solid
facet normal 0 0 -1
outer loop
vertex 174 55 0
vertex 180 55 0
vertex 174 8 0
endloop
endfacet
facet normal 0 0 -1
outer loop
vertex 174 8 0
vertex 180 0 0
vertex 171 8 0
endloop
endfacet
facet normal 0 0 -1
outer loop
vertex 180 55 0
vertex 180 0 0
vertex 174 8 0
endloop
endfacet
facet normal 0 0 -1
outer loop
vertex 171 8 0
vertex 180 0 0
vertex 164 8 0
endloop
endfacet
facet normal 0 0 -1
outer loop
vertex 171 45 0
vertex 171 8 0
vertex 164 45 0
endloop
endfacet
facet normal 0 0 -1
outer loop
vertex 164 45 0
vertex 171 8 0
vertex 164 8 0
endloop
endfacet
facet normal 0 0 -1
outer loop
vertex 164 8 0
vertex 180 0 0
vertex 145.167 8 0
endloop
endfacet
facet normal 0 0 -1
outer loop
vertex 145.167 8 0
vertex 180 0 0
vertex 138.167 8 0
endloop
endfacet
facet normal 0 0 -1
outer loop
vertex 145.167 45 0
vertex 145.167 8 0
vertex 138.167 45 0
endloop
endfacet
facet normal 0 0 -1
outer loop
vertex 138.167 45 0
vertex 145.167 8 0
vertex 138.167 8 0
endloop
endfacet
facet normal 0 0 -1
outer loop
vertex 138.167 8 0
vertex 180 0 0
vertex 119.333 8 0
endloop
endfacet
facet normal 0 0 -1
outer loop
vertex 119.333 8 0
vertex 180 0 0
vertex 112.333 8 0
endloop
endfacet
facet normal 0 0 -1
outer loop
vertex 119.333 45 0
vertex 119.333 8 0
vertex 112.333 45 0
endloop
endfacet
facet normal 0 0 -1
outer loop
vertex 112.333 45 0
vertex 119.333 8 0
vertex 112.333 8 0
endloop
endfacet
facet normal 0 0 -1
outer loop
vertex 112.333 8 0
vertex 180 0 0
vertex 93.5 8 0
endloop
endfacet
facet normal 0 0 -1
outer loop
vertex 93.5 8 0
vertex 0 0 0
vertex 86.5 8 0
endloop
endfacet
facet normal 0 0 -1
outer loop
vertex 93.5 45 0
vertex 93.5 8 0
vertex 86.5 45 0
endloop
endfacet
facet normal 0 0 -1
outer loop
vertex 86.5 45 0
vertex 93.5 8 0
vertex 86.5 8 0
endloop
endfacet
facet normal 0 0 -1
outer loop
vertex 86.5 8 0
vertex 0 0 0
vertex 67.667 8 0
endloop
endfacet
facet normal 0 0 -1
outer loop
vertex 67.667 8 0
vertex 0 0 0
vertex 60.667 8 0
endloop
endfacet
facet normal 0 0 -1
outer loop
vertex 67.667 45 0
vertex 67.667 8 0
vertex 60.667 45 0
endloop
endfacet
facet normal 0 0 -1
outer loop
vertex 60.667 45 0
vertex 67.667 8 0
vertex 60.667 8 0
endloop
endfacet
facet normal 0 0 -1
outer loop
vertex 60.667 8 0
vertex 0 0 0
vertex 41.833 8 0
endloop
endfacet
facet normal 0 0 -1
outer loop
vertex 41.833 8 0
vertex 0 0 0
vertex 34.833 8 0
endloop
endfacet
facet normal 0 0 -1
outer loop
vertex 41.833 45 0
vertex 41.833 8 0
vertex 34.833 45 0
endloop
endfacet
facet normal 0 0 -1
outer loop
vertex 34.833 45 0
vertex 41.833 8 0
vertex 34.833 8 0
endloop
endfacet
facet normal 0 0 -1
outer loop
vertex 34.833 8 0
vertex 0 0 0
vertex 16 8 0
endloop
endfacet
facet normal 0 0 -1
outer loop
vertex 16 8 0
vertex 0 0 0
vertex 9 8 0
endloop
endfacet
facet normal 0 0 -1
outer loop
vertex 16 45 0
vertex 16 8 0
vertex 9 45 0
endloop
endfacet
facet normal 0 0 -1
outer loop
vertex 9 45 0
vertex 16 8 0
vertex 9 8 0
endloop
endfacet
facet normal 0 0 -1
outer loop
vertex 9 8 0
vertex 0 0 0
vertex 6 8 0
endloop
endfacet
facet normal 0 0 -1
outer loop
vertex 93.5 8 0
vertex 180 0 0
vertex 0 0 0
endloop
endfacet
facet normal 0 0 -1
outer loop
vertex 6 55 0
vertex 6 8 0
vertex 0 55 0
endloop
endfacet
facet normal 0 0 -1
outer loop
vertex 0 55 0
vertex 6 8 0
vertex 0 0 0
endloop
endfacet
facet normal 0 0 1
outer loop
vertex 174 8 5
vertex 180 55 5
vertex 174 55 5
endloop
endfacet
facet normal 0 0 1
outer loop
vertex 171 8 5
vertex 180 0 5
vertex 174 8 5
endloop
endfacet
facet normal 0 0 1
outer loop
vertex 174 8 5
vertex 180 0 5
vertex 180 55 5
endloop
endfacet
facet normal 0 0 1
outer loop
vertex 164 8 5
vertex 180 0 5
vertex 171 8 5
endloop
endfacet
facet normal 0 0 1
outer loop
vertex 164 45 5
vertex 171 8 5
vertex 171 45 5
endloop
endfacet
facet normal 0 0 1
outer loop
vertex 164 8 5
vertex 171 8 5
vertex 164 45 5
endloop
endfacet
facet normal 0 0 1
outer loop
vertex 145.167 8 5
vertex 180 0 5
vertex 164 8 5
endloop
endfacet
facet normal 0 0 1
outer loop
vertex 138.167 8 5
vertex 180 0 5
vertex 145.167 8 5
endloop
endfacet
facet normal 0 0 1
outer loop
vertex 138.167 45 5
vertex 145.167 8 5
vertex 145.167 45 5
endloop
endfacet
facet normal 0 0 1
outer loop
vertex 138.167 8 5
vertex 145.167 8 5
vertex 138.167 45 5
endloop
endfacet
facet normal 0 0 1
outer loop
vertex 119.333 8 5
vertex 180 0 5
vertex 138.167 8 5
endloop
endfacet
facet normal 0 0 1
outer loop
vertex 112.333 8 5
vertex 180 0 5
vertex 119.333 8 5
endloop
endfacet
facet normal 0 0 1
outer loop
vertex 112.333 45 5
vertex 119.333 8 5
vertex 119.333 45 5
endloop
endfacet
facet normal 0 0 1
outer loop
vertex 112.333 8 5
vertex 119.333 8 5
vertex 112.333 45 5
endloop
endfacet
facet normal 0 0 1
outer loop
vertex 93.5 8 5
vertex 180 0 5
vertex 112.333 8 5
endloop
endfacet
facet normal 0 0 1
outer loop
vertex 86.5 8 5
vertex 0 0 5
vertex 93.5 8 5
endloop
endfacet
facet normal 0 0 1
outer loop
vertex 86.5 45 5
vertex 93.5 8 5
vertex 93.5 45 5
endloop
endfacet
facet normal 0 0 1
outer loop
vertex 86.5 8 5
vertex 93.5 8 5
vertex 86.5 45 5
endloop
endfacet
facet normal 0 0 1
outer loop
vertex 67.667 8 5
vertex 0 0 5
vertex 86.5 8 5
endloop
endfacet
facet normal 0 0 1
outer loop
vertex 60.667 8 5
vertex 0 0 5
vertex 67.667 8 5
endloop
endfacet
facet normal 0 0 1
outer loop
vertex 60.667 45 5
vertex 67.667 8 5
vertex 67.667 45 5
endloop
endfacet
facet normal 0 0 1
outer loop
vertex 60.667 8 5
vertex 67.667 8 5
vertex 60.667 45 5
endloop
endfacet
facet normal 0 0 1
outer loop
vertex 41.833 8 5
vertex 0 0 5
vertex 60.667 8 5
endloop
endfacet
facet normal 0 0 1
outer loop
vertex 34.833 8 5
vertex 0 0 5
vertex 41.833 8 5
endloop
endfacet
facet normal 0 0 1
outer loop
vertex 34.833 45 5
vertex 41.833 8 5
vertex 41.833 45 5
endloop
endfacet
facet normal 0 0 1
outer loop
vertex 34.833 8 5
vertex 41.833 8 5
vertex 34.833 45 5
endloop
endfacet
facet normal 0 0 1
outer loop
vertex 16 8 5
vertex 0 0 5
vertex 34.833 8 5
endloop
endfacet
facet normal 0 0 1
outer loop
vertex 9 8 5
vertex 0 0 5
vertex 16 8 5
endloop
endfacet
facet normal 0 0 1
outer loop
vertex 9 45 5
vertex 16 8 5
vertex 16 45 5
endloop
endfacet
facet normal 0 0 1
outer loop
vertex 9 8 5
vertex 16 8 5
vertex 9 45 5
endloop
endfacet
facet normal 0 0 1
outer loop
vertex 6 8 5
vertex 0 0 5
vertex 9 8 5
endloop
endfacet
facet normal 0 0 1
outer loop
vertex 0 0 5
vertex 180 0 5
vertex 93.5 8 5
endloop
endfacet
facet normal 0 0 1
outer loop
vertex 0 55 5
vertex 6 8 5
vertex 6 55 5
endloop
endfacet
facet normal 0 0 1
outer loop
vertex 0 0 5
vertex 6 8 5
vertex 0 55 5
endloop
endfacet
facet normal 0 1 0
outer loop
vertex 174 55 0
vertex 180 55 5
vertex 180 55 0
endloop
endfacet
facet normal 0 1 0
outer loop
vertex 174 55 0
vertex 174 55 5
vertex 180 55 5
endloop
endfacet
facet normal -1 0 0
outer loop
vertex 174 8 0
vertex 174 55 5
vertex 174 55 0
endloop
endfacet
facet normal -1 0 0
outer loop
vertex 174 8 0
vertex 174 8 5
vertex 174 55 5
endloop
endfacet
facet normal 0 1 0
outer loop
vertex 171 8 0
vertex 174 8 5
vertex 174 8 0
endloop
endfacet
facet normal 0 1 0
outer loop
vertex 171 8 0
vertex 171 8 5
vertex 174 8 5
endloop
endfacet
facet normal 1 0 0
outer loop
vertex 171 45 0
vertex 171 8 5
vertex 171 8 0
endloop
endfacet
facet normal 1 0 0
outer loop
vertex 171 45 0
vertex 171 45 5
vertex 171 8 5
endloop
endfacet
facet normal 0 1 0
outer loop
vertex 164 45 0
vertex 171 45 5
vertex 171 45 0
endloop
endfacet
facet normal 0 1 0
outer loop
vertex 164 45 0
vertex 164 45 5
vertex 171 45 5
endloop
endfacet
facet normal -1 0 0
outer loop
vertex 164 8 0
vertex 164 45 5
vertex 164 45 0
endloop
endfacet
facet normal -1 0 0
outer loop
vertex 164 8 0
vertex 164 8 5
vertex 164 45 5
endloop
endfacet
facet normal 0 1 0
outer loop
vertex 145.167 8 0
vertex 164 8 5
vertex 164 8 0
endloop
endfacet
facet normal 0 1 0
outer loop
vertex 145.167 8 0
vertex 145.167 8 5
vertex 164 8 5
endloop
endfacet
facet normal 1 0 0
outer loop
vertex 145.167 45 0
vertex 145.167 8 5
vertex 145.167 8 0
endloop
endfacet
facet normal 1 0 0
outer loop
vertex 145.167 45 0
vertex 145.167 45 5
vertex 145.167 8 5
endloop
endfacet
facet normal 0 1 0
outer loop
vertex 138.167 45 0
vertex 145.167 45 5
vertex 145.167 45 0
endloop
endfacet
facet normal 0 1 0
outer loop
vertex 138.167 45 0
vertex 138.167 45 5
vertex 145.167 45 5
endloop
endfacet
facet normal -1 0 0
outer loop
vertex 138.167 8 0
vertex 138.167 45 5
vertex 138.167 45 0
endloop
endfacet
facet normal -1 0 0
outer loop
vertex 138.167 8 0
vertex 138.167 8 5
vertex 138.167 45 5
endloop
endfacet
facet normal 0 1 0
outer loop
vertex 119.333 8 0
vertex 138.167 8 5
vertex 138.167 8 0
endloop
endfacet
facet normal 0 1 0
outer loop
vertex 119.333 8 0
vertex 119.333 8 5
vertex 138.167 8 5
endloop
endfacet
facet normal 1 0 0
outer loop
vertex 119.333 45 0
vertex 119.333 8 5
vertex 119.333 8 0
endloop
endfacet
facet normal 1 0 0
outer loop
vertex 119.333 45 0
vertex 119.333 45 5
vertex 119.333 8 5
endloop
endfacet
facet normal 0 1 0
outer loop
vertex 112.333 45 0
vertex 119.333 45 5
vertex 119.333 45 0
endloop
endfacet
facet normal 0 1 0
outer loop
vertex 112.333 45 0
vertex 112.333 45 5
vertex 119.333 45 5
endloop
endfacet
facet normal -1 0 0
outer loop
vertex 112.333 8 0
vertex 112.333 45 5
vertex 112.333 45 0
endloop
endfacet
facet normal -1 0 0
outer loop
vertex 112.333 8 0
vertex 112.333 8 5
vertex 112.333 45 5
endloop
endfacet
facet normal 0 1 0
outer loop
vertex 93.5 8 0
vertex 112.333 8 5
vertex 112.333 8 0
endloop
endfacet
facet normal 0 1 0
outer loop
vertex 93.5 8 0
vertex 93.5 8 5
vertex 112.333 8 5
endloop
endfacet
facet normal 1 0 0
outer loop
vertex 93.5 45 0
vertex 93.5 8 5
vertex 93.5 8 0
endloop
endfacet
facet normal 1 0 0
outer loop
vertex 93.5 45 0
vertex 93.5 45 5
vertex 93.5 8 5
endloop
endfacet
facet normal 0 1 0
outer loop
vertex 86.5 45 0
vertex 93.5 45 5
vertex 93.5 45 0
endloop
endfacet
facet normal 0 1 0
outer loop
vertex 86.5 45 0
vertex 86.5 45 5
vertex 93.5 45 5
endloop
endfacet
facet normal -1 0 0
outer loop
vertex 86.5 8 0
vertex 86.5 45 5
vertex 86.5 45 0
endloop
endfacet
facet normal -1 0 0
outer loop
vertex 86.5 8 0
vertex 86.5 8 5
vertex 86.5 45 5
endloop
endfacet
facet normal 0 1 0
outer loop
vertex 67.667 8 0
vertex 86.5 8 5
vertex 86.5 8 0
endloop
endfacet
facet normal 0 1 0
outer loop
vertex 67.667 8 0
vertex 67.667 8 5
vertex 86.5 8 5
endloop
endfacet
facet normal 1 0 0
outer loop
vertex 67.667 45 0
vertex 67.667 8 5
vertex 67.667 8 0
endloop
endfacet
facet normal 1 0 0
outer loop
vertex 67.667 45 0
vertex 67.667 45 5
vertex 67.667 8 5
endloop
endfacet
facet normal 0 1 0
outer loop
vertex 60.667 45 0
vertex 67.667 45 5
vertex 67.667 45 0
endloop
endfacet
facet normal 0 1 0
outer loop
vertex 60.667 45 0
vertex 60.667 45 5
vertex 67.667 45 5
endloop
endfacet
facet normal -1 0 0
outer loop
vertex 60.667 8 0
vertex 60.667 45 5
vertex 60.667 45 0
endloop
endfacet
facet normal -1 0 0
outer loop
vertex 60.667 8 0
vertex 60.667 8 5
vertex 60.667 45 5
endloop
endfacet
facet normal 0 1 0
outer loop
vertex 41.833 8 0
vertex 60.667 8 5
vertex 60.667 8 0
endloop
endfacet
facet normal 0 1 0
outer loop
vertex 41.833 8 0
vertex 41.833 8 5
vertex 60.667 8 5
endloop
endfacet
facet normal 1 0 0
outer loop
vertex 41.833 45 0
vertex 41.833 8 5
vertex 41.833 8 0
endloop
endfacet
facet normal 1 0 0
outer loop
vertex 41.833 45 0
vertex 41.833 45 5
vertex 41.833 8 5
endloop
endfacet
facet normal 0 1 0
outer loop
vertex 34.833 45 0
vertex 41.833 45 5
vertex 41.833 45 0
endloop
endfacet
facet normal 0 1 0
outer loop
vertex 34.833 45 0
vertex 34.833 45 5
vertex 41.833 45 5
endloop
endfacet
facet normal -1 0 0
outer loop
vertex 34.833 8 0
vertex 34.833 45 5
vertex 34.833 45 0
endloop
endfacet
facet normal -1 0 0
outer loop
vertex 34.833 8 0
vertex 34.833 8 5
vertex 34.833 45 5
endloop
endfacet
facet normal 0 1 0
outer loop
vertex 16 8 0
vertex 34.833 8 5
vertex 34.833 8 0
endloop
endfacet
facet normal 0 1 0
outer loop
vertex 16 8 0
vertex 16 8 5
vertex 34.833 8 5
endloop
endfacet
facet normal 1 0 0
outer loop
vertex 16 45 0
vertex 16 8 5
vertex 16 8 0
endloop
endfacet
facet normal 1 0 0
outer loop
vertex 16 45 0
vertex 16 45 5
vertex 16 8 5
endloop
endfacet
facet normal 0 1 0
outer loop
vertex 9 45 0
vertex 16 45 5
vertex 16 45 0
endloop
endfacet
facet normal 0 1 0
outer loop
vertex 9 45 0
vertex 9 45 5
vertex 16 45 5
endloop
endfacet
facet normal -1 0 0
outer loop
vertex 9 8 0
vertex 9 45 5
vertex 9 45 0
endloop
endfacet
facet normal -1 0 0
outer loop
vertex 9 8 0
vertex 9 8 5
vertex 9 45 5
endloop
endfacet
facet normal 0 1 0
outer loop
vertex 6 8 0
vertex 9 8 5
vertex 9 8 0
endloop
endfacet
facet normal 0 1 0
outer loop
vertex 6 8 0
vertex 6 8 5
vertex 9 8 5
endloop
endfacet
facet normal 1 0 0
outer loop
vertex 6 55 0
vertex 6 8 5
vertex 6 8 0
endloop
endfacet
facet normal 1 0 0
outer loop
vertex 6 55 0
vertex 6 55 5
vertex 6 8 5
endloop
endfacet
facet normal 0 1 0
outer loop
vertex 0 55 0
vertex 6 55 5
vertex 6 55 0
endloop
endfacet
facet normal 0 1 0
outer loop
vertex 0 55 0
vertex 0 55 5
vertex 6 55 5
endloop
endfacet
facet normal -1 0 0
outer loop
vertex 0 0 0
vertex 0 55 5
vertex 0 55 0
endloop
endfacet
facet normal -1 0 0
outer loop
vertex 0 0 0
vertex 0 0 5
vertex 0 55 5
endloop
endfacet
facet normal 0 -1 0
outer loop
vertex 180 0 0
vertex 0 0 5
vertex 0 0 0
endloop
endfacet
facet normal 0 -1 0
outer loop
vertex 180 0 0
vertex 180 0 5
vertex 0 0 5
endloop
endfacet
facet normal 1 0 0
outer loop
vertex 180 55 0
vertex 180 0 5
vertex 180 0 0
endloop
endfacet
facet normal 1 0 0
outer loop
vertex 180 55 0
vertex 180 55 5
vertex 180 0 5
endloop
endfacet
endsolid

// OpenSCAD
$fn = 32;

// ----------------------------------------------------------------------
// Guard grille: 7 slats over a 180 x 55 mm plate
// ----------------------------------------------------------------------

// --- parameters (mm) ---
profile_height = 5;       // extrusion height
profile_points = 36;      // points of the closed outline

profile = [[0, 0], [180, 0], [180, 55], [174, 55], [174, 8], [171, 8], [171, 45], [164, 45], [164, 8], [145.167, 8], [145.167, 45], [138.167, 45], [138.167, 8], [119.333, 8], [119.333, 45], [112.333, 45], [112.333, 8], [93.5, 8], [93.5, 45], [86.5, 45], [86.5, 8], [67.667, 8], [67.667, 45], [60.667, 45], [60.667, 8], [41.833, 8], [41.833, 45], [34.833, 45], [34.833, 8], [16, 8], [16, 45], [9, 45], [9, 8], [6, 8], [6, 55], [0, 55]];  // single closed polygon, 36 points, counter clockwise

// --- the one profile operation ---
linear_extrude(height = profile_height) polygon(points = profile);
